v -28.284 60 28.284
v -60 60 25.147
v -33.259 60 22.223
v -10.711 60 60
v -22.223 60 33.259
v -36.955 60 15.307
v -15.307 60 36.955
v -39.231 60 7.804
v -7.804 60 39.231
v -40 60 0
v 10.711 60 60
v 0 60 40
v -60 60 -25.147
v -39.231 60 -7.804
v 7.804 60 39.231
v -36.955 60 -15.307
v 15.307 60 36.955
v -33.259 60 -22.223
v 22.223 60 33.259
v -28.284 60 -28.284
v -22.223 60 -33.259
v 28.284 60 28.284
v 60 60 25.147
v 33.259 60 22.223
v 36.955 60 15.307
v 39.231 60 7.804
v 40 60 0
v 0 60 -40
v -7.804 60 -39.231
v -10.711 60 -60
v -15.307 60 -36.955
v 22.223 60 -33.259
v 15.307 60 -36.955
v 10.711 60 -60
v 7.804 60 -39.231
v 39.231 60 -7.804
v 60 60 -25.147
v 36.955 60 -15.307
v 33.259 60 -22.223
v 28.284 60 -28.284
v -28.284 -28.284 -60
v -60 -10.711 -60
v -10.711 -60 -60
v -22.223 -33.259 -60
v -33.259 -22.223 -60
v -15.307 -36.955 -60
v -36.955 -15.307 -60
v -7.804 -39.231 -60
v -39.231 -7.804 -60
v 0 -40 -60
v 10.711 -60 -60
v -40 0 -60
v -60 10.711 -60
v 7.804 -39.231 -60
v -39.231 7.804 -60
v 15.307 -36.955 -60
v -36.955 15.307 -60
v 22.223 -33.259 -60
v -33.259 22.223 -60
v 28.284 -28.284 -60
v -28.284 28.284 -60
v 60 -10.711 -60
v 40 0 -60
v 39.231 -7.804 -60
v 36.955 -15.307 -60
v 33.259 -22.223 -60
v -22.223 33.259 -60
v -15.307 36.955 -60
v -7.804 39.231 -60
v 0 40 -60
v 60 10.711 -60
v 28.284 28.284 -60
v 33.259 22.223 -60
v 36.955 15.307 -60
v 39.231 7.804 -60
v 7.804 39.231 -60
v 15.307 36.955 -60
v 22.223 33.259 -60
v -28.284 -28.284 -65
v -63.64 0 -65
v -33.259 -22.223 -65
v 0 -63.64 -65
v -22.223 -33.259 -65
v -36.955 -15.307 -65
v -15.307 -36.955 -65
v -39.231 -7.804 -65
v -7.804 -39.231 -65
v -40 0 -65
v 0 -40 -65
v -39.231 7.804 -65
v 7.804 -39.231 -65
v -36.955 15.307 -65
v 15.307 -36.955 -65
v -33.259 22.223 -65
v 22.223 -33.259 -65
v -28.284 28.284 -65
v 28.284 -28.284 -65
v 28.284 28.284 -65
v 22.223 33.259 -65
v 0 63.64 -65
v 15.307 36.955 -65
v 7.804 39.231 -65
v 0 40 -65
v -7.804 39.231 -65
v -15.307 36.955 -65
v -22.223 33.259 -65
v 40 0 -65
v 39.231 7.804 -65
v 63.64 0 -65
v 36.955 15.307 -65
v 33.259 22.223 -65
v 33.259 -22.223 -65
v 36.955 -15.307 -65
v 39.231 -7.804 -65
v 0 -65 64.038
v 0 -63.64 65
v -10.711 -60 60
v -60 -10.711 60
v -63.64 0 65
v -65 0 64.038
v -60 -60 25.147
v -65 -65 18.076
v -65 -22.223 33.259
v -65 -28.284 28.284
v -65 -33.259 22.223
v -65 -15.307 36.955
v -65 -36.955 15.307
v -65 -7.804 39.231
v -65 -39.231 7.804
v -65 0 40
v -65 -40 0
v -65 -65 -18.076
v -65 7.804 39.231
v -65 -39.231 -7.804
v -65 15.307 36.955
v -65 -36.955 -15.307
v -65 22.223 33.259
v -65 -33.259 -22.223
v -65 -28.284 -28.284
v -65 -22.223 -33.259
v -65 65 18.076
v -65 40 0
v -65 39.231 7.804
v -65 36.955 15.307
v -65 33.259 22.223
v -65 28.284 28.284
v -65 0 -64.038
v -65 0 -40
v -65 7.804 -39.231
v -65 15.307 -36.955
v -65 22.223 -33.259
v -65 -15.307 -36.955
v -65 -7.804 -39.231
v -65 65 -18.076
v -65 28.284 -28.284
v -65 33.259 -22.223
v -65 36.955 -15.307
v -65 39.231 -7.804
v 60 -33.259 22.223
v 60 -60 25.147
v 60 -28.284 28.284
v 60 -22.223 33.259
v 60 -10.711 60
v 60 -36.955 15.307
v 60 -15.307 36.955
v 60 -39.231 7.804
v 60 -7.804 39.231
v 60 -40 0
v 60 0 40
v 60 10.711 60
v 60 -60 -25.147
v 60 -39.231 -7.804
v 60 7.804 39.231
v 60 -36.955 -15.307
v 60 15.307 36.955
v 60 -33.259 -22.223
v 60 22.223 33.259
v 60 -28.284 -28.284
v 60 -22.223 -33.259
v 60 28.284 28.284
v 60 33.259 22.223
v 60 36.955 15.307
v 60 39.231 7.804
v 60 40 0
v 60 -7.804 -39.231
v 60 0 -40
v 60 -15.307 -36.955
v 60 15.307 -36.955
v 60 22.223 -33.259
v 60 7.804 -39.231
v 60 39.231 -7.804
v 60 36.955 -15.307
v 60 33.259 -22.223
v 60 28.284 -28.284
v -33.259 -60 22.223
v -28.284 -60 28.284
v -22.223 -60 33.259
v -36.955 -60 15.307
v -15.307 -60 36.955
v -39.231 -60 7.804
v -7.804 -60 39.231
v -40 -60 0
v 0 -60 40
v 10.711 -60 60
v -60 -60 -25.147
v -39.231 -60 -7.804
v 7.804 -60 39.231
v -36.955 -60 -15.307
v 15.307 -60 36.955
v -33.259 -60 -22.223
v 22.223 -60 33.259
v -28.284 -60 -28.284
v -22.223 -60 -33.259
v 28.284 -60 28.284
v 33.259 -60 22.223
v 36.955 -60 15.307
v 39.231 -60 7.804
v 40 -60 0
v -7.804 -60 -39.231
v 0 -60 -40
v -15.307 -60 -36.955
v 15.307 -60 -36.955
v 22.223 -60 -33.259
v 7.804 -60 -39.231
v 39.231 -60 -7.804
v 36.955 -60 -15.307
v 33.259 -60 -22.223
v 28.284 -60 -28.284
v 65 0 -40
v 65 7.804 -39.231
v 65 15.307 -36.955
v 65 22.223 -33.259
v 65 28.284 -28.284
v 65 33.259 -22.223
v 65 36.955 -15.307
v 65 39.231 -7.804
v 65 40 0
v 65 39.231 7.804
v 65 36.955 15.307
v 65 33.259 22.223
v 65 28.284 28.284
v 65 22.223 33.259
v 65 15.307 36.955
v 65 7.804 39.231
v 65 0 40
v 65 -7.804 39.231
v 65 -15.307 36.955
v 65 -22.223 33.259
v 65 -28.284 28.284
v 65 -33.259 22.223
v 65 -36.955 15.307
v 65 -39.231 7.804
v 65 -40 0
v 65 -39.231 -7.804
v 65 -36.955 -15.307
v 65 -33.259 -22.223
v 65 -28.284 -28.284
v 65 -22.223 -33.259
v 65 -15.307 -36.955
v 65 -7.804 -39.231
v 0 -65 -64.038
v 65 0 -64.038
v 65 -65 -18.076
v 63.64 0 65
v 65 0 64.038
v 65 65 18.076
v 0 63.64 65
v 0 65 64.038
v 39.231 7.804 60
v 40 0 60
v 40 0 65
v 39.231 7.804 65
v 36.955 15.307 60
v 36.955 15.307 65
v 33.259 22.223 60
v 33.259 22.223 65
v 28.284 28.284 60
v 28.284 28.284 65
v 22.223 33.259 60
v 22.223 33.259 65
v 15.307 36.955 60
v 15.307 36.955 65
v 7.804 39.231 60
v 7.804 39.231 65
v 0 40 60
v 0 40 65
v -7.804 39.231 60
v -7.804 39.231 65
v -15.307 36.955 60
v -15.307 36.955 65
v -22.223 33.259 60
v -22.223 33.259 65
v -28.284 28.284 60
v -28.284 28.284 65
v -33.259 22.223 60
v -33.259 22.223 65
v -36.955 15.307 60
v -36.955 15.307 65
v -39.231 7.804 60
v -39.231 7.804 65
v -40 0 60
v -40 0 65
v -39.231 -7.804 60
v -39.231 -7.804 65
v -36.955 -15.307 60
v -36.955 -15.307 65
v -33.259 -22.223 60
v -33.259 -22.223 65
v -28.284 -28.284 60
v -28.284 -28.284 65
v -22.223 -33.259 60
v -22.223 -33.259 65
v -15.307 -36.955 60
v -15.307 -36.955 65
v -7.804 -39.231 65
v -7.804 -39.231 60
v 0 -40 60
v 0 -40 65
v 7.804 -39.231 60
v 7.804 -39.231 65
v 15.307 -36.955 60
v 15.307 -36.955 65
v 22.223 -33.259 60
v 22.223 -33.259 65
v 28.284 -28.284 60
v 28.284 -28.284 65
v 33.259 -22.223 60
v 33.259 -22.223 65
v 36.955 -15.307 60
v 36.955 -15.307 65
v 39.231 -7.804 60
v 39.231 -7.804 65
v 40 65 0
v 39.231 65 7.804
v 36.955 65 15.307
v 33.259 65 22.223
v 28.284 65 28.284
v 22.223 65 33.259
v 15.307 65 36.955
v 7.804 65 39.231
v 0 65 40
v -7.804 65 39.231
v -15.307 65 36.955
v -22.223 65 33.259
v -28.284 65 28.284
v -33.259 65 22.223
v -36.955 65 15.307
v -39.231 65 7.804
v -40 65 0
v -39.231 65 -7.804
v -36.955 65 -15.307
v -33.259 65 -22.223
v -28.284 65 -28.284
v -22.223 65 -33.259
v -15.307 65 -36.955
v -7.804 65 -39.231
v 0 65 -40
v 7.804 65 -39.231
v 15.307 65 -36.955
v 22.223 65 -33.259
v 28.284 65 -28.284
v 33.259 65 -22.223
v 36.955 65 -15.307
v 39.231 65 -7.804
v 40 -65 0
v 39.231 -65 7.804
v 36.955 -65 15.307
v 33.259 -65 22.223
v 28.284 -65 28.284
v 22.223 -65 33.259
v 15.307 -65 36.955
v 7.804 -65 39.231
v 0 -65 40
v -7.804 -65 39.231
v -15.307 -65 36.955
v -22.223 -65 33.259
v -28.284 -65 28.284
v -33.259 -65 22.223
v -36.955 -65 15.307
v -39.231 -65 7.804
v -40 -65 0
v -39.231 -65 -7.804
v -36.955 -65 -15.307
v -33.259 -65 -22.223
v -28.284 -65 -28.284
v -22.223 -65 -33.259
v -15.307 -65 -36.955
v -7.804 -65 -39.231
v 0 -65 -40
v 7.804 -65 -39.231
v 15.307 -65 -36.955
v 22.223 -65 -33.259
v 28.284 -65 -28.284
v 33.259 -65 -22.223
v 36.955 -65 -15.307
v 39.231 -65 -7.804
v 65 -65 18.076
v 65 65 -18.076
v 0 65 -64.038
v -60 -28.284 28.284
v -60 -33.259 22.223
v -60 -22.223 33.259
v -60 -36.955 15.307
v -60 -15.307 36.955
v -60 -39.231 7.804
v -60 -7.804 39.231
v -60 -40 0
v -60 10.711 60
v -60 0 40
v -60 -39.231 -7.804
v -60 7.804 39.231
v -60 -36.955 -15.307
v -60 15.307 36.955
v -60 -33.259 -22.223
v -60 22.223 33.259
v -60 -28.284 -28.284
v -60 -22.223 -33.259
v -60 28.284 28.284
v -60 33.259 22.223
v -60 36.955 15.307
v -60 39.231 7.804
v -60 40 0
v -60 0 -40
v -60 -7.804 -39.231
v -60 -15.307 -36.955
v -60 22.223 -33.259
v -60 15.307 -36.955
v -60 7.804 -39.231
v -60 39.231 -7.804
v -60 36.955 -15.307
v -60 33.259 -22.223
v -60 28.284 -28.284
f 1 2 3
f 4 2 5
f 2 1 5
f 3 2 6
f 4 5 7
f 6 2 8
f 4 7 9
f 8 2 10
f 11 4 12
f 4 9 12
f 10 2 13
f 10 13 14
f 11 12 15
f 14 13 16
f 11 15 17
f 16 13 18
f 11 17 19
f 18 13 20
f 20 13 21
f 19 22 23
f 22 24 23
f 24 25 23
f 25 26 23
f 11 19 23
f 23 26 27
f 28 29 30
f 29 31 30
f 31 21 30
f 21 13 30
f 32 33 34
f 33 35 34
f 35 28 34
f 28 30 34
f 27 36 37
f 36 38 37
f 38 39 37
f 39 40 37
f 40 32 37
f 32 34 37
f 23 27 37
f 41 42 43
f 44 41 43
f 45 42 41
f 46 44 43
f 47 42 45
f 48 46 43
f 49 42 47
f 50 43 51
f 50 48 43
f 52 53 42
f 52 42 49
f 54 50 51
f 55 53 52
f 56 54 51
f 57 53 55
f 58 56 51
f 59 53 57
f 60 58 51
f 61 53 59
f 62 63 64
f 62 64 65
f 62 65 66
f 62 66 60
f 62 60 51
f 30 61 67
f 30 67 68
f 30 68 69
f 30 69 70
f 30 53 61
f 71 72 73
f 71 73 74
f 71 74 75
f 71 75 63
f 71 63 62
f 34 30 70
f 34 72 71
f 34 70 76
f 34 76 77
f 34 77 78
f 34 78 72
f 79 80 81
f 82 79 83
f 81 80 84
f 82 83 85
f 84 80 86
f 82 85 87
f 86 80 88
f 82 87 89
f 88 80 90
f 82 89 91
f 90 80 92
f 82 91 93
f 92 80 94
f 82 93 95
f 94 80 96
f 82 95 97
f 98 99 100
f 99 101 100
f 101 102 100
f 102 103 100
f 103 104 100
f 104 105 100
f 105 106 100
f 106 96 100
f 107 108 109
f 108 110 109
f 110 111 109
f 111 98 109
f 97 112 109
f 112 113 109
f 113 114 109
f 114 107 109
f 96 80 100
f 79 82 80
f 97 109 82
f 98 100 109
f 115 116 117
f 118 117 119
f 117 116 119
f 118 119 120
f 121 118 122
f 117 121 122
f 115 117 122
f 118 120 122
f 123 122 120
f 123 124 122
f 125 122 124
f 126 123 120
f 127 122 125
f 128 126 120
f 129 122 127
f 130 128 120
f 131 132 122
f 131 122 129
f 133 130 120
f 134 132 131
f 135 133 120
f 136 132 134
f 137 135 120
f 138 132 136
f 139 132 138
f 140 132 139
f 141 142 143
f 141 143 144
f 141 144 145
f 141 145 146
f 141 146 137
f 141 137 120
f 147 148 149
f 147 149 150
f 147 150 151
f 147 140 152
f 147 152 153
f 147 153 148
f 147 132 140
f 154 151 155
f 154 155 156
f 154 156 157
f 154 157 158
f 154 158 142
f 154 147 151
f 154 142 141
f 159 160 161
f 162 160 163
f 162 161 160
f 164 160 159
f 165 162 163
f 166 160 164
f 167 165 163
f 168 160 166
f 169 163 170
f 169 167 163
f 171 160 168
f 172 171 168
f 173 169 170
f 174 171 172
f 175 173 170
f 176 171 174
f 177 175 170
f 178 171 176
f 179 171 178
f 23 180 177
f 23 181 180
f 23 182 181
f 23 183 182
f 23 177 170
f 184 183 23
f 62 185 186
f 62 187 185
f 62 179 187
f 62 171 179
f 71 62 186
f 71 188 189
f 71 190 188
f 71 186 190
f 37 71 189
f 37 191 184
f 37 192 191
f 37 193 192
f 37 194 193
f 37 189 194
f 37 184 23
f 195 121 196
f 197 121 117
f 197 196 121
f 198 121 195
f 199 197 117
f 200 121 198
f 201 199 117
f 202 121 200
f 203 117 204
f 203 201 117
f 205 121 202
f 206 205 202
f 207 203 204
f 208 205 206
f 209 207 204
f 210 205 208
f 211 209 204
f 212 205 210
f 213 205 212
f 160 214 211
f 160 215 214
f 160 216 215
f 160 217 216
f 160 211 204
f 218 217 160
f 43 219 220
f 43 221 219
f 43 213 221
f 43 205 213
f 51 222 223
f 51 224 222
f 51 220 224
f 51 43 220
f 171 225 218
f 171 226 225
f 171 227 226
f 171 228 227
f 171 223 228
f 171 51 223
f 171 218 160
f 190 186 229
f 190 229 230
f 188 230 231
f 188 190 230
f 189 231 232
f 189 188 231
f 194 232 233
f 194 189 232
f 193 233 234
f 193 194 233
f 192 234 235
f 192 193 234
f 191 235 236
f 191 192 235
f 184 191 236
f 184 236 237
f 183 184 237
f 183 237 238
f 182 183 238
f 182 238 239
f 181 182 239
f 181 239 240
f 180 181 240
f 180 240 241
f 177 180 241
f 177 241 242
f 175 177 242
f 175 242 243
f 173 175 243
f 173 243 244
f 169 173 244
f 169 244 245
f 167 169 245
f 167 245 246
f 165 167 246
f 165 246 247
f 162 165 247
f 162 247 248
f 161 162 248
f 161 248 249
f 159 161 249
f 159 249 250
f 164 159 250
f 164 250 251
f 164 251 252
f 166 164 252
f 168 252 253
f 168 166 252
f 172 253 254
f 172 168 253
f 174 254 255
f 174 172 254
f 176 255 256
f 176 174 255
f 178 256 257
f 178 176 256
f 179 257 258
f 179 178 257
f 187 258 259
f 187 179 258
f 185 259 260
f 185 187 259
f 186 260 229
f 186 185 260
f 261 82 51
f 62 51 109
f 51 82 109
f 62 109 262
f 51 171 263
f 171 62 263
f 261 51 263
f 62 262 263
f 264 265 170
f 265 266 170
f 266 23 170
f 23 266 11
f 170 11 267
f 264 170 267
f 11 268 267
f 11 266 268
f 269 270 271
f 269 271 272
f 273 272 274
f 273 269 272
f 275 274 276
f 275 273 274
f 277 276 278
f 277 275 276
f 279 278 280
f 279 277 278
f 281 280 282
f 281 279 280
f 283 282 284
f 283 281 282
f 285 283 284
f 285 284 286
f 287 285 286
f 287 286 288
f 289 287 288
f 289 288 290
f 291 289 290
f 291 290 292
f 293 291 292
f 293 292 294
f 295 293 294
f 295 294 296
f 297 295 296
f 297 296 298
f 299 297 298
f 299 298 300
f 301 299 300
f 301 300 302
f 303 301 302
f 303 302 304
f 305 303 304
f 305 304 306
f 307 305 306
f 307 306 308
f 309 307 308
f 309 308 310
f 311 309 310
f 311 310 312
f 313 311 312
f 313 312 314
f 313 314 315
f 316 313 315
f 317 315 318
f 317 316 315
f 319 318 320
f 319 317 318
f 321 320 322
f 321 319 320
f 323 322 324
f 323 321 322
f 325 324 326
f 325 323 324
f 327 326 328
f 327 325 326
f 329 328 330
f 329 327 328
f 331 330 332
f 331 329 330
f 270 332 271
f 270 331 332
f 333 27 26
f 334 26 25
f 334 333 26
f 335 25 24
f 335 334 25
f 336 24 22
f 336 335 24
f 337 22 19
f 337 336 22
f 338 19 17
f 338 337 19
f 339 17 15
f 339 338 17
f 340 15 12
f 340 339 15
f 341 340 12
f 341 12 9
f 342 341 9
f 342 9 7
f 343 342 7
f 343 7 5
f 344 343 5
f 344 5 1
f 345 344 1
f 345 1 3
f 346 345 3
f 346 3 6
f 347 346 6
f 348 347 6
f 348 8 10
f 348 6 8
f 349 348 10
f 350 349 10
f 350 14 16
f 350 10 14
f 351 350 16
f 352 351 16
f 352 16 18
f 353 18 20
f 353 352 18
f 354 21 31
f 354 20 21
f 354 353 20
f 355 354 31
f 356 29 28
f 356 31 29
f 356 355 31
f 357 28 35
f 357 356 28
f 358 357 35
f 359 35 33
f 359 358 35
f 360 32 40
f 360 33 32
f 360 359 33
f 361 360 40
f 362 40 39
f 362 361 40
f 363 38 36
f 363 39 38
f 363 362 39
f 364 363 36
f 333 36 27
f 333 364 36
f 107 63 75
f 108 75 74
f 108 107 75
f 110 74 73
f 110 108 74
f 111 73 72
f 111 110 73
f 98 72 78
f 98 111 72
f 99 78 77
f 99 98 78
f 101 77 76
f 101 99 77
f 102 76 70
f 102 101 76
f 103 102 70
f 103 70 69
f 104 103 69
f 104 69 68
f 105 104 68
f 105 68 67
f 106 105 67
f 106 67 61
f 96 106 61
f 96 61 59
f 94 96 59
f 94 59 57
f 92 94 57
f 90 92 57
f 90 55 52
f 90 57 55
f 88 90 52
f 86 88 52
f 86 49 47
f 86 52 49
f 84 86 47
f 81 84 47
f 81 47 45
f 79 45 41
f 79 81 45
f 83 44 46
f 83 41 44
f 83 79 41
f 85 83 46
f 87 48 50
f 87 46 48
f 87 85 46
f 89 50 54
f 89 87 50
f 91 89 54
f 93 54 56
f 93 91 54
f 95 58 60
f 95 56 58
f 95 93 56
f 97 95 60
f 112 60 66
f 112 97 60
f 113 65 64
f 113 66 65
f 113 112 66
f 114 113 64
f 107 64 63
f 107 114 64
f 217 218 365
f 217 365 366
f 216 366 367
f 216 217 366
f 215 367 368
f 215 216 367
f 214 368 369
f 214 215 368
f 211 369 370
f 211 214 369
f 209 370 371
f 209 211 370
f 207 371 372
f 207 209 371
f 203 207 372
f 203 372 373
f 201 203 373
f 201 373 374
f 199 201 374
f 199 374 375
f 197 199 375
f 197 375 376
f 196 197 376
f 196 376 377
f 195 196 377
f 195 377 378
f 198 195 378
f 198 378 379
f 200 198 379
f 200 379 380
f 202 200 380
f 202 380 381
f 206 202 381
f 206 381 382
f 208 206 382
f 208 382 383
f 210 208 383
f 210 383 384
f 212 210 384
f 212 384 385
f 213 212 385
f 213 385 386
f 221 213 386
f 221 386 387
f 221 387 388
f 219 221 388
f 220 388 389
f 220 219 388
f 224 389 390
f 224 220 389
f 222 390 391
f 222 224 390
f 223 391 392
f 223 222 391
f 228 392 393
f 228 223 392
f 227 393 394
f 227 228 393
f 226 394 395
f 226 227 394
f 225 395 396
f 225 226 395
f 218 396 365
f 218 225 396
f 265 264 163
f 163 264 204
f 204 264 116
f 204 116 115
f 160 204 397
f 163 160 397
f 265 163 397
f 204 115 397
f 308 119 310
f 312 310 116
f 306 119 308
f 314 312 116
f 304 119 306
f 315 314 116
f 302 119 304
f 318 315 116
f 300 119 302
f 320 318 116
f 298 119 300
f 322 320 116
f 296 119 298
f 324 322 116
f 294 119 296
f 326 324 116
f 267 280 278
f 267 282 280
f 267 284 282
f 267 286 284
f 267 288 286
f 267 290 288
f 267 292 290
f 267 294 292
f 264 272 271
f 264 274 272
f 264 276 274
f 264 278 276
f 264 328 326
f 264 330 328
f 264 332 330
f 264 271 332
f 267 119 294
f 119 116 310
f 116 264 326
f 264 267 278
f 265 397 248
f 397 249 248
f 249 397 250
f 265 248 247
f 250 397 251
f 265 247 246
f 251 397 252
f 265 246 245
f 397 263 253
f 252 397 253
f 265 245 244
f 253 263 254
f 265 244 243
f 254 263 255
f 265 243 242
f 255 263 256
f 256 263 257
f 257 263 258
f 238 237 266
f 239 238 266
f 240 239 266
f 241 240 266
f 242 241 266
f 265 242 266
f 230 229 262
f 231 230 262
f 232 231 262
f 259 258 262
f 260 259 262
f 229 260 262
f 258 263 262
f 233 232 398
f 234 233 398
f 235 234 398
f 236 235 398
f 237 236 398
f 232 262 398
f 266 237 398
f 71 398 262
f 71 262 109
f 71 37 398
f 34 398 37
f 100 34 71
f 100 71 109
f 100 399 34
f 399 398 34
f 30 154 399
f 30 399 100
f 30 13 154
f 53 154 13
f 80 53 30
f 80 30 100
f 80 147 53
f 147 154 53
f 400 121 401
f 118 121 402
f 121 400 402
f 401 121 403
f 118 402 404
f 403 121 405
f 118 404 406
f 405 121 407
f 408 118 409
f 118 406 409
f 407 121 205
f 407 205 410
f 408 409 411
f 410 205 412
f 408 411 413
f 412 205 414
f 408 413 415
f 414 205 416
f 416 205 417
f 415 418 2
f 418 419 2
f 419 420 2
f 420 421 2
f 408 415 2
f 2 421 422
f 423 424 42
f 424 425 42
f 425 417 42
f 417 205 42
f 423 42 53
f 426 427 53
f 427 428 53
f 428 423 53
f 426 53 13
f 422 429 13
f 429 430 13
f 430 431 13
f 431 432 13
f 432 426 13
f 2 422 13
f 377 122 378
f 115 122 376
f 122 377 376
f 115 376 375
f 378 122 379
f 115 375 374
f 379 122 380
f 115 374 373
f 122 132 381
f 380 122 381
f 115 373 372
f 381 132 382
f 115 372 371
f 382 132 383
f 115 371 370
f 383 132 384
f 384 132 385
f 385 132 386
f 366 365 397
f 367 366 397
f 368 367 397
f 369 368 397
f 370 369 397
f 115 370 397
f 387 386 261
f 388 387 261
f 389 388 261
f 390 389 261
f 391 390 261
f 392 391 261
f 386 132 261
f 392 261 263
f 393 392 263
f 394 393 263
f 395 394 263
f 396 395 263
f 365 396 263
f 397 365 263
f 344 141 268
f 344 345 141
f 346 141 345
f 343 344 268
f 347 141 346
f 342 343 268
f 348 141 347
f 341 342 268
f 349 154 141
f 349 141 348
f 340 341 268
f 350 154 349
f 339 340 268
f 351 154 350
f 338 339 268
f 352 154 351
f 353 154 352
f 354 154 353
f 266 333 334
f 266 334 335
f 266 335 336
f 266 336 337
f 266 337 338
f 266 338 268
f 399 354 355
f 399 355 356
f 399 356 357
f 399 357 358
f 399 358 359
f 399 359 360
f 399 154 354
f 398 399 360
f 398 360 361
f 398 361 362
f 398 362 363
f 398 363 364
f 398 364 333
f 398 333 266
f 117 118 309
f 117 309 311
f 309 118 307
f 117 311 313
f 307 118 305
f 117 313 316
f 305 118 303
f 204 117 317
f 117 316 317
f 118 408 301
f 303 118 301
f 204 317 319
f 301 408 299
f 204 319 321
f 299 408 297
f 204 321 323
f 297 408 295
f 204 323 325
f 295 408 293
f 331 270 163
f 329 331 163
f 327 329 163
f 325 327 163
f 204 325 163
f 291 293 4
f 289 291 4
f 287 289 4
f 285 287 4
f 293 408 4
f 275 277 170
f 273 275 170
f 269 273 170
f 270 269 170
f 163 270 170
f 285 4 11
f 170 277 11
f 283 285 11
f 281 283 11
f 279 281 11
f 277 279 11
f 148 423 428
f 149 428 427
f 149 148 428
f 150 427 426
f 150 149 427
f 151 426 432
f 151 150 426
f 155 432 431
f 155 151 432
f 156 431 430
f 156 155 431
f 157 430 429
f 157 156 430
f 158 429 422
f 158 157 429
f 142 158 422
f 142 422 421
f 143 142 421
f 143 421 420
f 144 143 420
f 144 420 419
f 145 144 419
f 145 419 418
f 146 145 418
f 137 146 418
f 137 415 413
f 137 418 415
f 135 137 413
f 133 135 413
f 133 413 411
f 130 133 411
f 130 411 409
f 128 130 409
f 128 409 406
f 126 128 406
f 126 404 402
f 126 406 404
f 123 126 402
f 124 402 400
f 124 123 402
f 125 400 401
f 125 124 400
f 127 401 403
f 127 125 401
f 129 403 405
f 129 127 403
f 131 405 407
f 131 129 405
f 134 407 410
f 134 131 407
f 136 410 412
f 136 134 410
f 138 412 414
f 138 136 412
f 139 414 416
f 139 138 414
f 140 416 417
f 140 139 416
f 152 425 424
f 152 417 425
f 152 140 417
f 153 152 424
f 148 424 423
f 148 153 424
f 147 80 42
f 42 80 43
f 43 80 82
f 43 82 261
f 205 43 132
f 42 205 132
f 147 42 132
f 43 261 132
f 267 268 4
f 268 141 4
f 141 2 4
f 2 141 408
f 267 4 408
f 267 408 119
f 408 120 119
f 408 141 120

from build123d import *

# Parameters (mm, degrees)
PAD001_DEPTH            = 45.961941
PAD_DEPTH               = 45.961941
CYLINDER002_R           = 40
CYLINDER002_DEPTH       = 130
CYLINDER002_PITCH_ANGLE = 90
CYLINDER001_R           = 40
CYLINDER001_DEPTH       = 130
CYLINDER001_ROLL_ANGLE  = 90
CYLINDER_R              = 40
CYLINDER_DEPTH          = 130
BOX001_W                = 120
BOX001_H                = 120
BOX001_DEPTH            = 120
BOX_W                   = 130
BOX_H                   = 130
BOX_DEPTH               = 130


with BuildPart() as pad001:
    # Sketch001 → Pad001 (new body, symmetric)
    with BuildSketch(Plane(origin=(0, 0, 0), x_dir=(-0.707107, 0.707107, 0), z_dir=(0.707107, 0.707107, 0))):
        Polygon((-100, 10), (-100, 85), (-25, 85), align=None)
        Polygon((25, 85), (100, 85), (100, 10), align=None)
        Polygon((25, -85), (100, -85), (100, -10), align=None)
        Polygon((-100, -10), (-100, -85), (-25, -85), align=None)
    extrude(amount=PAD001_DEPTH, both=True)


with BuildPart() as pad:
    # Sketch → Pad (new body, symmetric)
    with BuildSketch(Plane(origin=(0, 0, 0), x_dir=(0.707107, 0.707107, 0), z_dir=(0.707107, -0.707107, 0))):
        Polygon((-100, 10), (-100, 85), (-25, 85), align=None)
        Polygon((25, 85), (100, 85), (100, 10), align=None)
        Polygon((25, -85), (100, -85), (100, -10), align=None)
        Polygon((-100, -10), (-100, -85), (-25, -85), align=None)
    extrude(amount=PAD_DEPTH, both=True)


with BuildPart() as cylinder002:
    # Cylinder002 → Cylinder002 (new body)
    with BuildSketch(Plane.XY):
        Circle(CYLINDER002_R)
    extrude(amount=CYLINDER002_DEPTH)


with BuildPart() as cylinder002_1:
    # Cylinder002 pitch: moved
    add(cylinder002.part.rotate(Axis((0, 0, 0), (0, 1, 0)), CYLINDER002_PITCH_ANGLE))


with BuildPart() as cylinder002_2:
    # Cylinder002 placement: moved
    add(cylinder002_1.part.moved(Location((-65, 0, 0))))


with BuildPart() as cylinder001:
    # Cylinder001 → Cylinder001 (new body)
    with BuildSketch(Plane.XY):
        Circle(CYLINDER001_R)
    extrude(amount=CYLINDER001_DEPTH)


with BuildPart() as cylinder001_1:
    # Cylinder001 roll: moved
    add(cylinder001.part.rotate(Axis((0, 0, 0), (1, 0, 0)), CYLINDER001_ROLL_ANGLE))


with BuildPart() as cylinder001_2:
    # Cylinder001 placement: moved
    add(cylinder001_1.part.moved(Location((0, 65, 0))))


with BuildPart() as cylinder:
    # Cylinder → Cylinder (new body)
    with BuildSketch(Plane.XY.offset(-65)):
        Circle(CYLINDER_R)
    extrude(amount=CYLINDER_DEPTH)


with BuildPart() as cube001:
    # Box001 → Box001 (new body)
    with BuildSketch(Plane(origin=(-60, -60, -60), x_dir=(1, 0, 0), z_dir=(0, 0, 1))):
        with Locations((60, 60)):
            Rectangle(BOX001_W, BOX001_H)
    extrude(amount=BOX001_DEPTH)


with BuildPart() as cut005:
    # Box → Box (new body)
    with BuildSketch(Plane(origin=(-65, -65, -65), x_dir=(1, 0, 0), z_dir=(0, 0, 1))):
        with Locations((65, 65)):
            Rectangle(BOX_W, BOX_H)
    extrude(amount=BOX_DEPTH)

    # Cut: cut Cube001
    add(cube001.part, mode=Mode.SUBTRACT)

    # Cut001: cut Cylinder
    add(cylinder.part, mode=Mode.SUBTRACT)

    # Cut002: cut Cylinder001
    add(cylinder001_2.part, mode=Mode.SUBTRACT)

    # Cut003: cut Cylinder002
    add(cylinder002_2.part, mode=Mode.SUBTRACT)

    # Cut004: cut Pad
    add(pad.part, mode=Mode.SUBTRACT)

    # Cut005: cut Pad001
    add(pad001.part, mode=Mode.SUBTRACT)


solid = cut005.part
